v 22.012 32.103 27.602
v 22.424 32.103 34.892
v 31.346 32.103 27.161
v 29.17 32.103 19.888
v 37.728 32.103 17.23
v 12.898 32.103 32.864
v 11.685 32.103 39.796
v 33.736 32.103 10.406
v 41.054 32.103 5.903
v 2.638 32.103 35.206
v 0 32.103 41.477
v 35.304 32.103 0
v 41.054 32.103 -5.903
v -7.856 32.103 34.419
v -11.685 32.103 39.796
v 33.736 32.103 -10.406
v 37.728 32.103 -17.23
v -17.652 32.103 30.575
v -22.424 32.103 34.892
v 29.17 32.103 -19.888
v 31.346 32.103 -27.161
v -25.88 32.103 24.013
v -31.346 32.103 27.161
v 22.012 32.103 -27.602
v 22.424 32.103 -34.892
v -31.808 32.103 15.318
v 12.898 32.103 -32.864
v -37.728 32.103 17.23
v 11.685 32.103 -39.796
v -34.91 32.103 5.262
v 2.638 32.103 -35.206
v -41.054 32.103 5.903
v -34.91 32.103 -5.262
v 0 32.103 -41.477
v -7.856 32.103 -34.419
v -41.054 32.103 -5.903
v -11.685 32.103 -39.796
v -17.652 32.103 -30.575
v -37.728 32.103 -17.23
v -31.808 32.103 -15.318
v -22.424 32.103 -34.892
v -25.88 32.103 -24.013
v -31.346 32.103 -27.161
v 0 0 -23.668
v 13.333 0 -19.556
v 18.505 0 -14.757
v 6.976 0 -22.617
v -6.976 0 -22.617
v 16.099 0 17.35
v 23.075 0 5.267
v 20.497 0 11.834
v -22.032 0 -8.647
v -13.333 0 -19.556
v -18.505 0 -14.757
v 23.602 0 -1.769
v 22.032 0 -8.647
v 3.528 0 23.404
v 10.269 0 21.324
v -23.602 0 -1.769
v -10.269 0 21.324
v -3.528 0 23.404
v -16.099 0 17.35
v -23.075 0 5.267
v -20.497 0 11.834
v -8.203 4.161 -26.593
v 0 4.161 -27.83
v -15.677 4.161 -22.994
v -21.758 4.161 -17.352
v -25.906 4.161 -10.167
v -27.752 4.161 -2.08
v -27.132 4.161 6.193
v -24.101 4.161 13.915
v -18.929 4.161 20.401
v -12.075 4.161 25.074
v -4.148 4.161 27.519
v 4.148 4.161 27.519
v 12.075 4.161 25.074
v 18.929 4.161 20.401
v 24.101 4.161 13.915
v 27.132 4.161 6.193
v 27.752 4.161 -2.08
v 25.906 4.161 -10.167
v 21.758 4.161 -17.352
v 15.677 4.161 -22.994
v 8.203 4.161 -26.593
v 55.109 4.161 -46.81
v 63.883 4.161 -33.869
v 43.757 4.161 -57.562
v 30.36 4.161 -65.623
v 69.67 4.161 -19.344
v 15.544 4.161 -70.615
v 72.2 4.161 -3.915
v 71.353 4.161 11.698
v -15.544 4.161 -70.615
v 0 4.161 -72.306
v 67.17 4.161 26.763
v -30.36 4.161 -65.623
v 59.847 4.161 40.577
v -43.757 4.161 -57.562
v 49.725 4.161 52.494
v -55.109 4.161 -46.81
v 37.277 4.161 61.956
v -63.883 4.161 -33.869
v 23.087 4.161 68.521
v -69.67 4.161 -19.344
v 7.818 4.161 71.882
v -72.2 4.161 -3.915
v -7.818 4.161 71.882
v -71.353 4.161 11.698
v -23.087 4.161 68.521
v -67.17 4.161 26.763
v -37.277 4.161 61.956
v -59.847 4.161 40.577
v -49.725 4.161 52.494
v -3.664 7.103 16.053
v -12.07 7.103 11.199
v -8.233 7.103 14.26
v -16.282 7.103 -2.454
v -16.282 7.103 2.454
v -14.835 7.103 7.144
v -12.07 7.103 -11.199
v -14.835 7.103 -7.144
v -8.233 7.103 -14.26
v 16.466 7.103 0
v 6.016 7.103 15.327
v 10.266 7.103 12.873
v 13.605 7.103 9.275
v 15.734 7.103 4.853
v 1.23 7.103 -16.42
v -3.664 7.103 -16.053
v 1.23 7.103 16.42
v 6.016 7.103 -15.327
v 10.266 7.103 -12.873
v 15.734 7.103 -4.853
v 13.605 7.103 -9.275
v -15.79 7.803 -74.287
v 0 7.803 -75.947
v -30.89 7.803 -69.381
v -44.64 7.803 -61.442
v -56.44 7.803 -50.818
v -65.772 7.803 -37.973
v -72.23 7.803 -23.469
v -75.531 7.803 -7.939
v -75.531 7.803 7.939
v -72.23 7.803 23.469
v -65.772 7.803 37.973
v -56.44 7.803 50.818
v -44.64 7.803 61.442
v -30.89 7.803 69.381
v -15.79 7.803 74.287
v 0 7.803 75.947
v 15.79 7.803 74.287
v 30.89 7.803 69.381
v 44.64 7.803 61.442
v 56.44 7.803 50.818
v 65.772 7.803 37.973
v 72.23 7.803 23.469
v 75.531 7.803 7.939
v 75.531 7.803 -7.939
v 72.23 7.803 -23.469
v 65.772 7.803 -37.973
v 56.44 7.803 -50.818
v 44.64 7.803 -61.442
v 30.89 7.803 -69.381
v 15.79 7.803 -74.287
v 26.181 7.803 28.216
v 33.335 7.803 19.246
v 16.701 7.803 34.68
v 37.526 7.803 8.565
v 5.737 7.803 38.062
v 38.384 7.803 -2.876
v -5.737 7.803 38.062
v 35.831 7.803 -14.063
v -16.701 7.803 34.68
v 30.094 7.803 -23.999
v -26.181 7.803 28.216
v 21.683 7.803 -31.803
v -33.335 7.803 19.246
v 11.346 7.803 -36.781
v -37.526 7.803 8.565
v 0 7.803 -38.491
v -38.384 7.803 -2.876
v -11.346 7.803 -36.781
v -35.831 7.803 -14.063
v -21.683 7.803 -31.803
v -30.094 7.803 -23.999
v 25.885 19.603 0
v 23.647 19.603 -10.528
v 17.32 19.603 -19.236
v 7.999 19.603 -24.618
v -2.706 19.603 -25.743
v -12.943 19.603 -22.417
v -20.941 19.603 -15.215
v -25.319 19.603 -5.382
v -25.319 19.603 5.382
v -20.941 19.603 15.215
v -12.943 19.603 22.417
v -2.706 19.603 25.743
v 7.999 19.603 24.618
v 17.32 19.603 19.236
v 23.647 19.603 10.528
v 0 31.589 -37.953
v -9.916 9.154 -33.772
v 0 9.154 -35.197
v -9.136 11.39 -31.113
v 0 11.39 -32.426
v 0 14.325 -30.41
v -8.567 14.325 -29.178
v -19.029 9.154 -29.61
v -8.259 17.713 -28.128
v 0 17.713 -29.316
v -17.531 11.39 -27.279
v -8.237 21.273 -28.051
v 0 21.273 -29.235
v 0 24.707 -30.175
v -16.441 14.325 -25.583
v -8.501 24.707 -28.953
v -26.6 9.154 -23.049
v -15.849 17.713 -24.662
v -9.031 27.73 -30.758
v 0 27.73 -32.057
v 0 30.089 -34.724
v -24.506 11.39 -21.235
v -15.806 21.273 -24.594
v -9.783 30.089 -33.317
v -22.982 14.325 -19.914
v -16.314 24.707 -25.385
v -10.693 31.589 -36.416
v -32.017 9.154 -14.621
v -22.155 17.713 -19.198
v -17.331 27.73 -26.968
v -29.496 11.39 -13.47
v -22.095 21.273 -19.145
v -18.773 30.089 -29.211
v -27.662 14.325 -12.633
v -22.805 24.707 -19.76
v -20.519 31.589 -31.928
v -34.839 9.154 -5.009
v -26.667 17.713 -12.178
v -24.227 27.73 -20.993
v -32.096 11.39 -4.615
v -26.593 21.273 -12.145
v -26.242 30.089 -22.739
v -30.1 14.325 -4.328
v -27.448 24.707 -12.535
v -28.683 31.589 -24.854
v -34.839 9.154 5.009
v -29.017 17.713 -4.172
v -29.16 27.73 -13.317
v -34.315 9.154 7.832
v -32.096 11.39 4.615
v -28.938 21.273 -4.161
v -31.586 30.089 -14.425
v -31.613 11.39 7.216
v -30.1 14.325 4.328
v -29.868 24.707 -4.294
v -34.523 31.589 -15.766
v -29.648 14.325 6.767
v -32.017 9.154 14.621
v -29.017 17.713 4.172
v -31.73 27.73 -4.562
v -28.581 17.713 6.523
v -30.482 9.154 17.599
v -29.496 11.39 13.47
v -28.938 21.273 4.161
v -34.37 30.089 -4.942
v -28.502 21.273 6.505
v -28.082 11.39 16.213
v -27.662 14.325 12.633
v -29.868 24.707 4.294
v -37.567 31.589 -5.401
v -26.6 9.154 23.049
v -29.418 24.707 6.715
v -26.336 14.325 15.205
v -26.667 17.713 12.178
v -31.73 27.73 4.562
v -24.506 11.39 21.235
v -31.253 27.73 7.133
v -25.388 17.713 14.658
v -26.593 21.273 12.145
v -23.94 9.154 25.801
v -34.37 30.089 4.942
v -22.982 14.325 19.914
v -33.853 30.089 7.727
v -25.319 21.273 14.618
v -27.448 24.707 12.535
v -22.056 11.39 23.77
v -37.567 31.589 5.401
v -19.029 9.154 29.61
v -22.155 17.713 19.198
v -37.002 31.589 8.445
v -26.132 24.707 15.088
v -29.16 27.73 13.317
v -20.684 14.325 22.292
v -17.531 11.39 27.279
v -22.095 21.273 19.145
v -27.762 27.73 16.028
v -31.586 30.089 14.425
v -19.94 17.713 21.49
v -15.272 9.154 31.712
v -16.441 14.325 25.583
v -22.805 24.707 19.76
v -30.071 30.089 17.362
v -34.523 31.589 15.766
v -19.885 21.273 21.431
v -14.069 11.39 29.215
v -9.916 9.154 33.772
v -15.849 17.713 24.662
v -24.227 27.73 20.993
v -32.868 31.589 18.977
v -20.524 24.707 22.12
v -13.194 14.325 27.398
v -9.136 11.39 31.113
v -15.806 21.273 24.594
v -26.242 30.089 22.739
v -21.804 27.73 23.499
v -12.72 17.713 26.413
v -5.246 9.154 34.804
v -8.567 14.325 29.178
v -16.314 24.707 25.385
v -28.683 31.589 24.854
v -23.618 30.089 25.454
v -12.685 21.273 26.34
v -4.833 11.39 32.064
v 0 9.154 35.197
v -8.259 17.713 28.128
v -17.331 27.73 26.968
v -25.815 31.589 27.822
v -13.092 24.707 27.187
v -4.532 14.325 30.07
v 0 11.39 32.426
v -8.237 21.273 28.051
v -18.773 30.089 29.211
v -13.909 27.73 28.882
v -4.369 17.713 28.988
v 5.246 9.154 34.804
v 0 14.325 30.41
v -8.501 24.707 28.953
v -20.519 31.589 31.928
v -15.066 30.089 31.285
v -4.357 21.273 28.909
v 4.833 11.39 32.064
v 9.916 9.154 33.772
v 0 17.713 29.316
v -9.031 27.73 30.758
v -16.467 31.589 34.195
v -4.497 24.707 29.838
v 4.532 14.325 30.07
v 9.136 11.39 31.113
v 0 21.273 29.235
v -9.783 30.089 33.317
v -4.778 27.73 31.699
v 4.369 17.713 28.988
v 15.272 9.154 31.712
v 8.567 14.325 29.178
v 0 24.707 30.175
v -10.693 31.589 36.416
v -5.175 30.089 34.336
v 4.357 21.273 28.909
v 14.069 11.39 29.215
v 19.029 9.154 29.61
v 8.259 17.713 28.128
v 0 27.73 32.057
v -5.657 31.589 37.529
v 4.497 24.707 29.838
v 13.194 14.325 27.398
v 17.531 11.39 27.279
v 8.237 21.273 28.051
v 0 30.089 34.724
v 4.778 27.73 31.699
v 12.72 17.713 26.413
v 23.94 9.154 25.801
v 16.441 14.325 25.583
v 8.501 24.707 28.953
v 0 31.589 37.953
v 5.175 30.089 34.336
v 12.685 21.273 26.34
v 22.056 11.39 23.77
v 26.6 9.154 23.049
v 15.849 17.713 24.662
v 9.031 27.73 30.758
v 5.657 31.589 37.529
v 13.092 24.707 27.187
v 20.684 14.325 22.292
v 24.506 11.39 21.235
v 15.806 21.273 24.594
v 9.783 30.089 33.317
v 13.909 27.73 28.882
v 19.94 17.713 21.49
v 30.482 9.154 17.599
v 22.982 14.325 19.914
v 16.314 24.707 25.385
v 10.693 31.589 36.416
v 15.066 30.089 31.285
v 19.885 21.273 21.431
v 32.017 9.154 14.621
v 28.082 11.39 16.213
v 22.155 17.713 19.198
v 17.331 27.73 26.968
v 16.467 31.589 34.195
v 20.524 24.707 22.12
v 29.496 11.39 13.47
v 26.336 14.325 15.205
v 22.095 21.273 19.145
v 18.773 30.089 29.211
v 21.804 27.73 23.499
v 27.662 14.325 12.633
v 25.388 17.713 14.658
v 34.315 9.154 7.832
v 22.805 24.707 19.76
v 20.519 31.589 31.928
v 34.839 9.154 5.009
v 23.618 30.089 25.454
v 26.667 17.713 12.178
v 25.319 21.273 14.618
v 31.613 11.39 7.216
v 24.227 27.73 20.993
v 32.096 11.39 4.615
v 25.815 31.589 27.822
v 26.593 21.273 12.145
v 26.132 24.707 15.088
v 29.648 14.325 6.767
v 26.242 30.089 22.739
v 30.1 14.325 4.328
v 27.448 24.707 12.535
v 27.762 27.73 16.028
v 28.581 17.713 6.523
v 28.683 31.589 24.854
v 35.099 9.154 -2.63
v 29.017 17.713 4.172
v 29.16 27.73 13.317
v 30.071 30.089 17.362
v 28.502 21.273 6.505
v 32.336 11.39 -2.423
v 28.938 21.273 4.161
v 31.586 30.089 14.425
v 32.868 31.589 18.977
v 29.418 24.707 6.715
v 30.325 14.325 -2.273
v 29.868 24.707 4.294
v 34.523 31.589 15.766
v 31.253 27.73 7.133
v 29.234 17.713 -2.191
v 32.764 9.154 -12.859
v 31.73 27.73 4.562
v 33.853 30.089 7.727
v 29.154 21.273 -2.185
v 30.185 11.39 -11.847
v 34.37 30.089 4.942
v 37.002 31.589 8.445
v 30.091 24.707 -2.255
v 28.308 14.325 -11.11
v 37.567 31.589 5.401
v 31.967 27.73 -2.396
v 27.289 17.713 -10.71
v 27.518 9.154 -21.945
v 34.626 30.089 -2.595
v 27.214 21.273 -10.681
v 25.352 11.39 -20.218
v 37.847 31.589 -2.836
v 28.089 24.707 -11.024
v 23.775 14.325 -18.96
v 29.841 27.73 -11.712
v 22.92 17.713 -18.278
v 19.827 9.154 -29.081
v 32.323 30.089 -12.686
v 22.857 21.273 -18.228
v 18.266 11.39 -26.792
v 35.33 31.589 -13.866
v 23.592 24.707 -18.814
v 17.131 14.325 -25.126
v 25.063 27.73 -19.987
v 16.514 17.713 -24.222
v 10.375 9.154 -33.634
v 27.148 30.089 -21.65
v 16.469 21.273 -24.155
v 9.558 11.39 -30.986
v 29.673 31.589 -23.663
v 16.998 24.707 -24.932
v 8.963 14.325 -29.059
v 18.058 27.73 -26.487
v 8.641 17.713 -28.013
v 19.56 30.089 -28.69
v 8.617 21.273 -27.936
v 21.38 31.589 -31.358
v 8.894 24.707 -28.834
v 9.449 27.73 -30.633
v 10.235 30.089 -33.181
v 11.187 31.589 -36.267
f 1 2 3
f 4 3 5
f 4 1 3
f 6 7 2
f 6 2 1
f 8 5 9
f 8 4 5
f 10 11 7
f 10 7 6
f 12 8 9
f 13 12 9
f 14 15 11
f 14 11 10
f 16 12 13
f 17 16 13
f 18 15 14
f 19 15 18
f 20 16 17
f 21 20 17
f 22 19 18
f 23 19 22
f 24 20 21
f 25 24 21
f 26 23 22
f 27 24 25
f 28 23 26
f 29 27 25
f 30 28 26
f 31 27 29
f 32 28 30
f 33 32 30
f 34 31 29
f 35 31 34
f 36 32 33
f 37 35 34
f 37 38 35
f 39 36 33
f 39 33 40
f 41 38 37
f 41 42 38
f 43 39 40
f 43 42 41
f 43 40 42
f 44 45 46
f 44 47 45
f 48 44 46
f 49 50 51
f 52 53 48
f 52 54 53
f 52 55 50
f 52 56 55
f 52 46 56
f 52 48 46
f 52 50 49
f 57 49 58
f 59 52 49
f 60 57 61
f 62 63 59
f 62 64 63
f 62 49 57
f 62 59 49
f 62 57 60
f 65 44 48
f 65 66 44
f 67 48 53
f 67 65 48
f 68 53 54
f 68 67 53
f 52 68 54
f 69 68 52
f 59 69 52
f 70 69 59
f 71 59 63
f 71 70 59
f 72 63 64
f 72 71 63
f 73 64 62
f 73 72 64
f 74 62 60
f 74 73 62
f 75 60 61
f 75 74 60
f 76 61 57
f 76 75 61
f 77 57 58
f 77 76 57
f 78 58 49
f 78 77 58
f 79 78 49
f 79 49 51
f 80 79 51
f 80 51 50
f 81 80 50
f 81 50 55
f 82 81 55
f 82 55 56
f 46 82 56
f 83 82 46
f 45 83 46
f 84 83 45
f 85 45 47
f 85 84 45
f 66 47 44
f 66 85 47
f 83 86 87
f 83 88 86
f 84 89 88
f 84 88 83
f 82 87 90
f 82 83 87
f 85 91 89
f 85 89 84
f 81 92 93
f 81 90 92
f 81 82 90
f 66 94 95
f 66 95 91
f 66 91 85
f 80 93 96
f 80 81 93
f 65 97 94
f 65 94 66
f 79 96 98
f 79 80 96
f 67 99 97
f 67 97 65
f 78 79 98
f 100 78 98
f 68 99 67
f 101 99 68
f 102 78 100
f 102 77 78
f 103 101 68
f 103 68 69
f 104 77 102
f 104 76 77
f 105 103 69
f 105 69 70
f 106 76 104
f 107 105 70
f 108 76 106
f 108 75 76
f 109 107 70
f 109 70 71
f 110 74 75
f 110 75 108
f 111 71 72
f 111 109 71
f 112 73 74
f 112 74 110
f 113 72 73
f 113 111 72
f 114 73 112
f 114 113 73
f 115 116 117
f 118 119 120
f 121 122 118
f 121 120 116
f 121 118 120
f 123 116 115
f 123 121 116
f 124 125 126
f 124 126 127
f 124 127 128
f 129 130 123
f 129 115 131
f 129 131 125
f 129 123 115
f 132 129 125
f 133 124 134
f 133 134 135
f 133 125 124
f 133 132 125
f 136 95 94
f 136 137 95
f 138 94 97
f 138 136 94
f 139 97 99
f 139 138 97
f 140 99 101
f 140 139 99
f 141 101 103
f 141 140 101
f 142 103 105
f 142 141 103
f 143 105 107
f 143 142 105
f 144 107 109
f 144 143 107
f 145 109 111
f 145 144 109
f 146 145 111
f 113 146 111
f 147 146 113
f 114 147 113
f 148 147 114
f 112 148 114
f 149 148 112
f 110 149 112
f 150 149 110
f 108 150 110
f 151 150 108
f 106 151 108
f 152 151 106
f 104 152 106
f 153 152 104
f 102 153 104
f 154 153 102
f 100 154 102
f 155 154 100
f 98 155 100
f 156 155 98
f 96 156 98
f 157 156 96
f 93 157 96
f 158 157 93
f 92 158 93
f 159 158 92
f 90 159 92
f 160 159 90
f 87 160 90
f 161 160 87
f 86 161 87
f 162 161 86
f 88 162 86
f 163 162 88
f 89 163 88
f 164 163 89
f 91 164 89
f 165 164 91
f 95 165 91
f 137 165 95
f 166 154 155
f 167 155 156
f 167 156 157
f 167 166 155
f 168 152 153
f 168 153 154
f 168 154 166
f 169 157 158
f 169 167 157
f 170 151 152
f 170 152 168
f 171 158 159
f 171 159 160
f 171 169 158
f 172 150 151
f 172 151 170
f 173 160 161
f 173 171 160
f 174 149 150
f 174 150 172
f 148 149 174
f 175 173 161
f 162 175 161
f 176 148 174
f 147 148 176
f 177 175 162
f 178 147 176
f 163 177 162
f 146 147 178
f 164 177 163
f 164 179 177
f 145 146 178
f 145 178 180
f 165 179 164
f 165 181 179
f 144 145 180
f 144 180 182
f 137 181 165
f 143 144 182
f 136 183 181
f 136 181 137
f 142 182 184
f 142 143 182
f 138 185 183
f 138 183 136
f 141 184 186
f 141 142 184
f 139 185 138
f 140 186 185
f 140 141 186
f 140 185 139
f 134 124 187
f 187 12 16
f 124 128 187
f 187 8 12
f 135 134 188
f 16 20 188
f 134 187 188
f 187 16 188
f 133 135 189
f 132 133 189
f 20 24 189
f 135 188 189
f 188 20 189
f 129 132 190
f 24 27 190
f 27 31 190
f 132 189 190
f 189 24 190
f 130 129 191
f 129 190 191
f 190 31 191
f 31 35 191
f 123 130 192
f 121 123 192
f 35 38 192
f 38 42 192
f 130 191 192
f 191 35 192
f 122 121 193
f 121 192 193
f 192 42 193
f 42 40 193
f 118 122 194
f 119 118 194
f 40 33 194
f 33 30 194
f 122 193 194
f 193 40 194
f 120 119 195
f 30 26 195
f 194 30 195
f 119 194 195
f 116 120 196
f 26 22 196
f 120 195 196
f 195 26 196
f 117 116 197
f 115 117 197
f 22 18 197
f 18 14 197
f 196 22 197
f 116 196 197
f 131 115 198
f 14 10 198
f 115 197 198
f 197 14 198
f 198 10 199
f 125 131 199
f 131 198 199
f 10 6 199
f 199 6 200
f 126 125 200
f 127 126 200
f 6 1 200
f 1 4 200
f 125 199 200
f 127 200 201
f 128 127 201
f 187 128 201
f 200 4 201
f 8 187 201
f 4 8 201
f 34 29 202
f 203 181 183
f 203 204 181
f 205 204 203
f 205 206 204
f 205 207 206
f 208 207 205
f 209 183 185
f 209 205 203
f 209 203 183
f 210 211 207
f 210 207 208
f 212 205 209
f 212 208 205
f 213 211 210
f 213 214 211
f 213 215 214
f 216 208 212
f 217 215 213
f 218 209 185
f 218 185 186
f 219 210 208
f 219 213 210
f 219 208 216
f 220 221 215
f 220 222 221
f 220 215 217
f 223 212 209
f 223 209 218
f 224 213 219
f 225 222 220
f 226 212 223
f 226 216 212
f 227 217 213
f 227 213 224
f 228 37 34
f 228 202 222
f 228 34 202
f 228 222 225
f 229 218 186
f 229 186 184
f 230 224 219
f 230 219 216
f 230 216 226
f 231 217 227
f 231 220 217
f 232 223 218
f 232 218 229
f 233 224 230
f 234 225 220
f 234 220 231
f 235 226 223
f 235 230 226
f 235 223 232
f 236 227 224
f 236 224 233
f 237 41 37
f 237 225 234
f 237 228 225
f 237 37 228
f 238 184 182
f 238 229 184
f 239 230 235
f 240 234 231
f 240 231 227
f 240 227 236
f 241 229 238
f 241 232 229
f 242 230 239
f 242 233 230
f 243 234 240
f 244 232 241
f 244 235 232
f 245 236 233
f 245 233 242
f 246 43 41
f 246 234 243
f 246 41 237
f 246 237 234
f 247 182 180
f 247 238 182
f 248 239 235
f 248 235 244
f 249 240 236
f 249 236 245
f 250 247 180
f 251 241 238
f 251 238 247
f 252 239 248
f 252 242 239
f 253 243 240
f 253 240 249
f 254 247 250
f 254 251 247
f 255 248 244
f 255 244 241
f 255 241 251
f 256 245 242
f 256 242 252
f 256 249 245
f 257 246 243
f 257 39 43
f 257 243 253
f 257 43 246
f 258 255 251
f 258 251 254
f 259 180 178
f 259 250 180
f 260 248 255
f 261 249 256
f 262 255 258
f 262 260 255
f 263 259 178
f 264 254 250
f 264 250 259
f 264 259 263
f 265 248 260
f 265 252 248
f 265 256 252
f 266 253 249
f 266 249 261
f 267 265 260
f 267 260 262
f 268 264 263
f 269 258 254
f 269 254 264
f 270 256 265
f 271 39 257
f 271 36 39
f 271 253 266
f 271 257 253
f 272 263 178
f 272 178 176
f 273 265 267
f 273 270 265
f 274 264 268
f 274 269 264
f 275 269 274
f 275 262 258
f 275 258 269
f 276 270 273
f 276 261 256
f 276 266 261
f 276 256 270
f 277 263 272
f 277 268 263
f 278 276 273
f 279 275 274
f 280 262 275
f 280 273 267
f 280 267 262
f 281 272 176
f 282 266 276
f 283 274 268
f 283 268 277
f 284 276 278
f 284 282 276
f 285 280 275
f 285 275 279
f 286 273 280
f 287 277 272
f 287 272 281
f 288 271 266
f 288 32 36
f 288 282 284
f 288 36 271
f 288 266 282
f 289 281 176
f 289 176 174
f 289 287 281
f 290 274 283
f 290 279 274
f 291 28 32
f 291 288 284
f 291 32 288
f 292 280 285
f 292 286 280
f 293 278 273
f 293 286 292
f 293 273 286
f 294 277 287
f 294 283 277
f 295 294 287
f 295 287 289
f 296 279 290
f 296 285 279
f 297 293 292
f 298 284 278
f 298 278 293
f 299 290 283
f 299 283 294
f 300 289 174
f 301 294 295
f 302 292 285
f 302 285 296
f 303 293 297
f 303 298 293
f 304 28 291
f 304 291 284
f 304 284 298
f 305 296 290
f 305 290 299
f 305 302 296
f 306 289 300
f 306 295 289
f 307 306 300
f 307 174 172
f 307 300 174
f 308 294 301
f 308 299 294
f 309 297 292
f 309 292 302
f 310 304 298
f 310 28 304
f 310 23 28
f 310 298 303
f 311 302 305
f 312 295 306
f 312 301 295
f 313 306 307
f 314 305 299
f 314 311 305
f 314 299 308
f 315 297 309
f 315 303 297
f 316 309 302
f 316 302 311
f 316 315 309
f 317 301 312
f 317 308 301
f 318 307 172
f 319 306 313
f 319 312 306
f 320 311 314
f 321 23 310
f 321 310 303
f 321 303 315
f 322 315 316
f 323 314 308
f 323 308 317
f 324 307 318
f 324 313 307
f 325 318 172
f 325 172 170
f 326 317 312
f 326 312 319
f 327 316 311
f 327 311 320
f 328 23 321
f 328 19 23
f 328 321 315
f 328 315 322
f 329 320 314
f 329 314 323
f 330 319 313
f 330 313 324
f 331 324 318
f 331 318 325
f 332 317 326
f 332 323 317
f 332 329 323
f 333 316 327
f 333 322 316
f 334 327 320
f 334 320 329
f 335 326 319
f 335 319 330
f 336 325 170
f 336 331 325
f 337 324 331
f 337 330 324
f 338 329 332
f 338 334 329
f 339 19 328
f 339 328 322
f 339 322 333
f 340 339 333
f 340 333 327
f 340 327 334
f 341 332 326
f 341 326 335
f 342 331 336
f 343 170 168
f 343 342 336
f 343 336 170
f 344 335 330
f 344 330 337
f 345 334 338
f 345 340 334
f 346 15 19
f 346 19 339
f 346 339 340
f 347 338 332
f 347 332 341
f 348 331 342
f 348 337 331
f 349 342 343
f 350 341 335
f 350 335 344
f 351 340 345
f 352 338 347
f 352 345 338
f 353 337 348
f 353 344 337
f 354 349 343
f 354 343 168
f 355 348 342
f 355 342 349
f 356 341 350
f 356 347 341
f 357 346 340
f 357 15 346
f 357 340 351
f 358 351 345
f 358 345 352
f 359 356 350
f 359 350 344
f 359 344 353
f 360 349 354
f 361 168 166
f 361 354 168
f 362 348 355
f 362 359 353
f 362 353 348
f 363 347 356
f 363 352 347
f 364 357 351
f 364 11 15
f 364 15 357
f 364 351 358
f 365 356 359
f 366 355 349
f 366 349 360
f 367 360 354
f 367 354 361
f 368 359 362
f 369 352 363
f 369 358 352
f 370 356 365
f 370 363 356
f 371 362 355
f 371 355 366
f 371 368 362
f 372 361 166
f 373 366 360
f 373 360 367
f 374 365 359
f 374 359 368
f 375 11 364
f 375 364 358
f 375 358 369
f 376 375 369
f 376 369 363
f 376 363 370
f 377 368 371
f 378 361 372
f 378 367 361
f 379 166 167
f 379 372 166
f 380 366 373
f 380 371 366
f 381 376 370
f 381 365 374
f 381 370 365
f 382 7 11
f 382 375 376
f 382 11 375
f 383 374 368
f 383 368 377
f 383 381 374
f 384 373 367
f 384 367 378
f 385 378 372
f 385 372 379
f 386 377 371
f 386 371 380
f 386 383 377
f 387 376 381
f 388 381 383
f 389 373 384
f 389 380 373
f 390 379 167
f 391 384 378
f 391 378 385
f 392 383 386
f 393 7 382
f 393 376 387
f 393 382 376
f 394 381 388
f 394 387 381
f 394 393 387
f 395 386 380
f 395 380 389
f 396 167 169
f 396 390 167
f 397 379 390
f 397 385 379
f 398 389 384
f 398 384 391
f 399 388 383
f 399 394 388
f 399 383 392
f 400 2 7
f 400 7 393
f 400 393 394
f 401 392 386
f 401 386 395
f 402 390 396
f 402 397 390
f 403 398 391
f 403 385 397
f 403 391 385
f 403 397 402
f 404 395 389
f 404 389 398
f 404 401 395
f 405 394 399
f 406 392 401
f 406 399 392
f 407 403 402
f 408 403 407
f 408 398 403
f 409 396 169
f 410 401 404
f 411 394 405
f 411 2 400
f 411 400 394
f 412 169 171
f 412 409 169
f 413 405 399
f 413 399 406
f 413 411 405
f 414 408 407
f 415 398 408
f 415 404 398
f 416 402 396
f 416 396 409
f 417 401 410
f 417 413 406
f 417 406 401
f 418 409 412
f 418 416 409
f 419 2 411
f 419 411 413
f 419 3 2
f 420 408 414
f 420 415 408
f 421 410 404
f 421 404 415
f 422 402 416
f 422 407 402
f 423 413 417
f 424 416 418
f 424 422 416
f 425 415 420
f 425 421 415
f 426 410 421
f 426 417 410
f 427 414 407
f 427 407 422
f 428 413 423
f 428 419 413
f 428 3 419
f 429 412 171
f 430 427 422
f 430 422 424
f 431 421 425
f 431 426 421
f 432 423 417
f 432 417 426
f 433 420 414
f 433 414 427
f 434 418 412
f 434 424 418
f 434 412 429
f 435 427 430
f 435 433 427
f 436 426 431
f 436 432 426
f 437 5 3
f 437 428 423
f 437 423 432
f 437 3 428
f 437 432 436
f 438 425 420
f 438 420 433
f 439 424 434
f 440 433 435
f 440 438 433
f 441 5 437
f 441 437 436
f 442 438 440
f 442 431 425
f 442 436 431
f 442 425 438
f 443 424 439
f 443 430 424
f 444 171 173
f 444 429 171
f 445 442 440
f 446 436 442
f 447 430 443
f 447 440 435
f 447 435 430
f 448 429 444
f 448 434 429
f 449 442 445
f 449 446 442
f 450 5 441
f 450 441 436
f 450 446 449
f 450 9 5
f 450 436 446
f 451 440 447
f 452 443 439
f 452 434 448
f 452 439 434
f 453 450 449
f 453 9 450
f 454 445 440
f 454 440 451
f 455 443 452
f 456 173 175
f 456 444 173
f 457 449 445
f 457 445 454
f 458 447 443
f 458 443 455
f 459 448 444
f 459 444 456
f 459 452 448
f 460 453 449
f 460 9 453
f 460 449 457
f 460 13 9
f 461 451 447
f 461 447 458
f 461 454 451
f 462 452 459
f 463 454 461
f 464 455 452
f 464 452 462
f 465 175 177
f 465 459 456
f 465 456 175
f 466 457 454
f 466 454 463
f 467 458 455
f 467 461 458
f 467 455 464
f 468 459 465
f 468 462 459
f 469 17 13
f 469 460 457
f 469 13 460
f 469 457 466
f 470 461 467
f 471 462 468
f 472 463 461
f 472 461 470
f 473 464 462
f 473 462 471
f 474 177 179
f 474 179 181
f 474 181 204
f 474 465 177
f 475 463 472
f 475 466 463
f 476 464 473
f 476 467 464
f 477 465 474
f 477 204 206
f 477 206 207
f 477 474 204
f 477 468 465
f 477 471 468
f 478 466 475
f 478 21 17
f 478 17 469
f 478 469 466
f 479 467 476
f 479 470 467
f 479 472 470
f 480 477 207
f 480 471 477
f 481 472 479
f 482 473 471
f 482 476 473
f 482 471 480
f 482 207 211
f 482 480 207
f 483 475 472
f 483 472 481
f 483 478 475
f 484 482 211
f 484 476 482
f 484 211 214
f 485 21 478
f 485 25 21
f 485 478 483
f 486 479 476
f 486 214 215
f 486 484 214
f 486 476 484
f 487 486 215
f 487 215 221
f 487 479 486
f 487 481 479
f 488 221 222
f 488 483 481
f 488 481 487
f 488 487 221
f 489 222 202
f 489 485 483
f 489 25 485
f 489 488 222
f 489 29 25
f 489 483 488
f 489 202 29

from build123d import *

# Parameters (mm, degrees)
SKETCH3_R          = 35.304496673
CUT_EXTRUDE2_DEPTH = 25
CUT_EXTRUDE2_DRAFT = -37


with BuildPart() as part:
    # Sketch1 → Revolve1 (revolve)
    with BuildSketch(Plane.XY, mode=Mode.PRIVATE) as revolve1_sk:
        Polygon((0, 0), (-23.668379582, 0), (-27.829852915, 4.161473333), (-72.305599163, 4.161473333), (-75.946888329, 7.8027625), (0, 7.8027625), align=None)
    revolve(revolve1_sk.sketch.rotate(Axis((0, 0, 0), (0, 1, 0)), 270), axis=Axis((0, 0, 0), (0, 1, 0)))

    # Sketch2 → Revolve2 (revolve)
    with BuildSketch(Plane.XY, mode=Mode.PRIVATE) as revolve2_sk:
        with BuildLine():
            Line((-41.476502692, 32.102501356), (0, 32.102501356))
            Line((0, 32.102501356), (0, 7.8027625))
            Line((0, 7.8027625), (-38.491451362, 7.8027625))
            ThreePointArc((-38.491451362, 7.8027625), (-29.235303405, 21.273030582), (-41.476502692, 32.102501356))
        make_face()
    revolve(revolve2_sk.sketch.rotate(Axis((0, 0, 0), (0, 1, 0)), 270), axis=Axis((0, 0, 0), (0, 1, 0)))


with BuildPart() as cut_extrude2_tool:
    # Sketch3 → Cut-Extrude2 (with draft: the straight prism first)
    with BuildSketch(Plane(origin=(0, 32.102501356, 0), x_dir=(1, 0, 0), z_dir=(0, 1, 0))):
        Circle(SKETCH3_R)
    extrude(amount=-CUT_EXTRUDE2_DEPTH)
    # Cut-Extrude2: the draft: its side faces are tilted about the plane it starts from
    cut_extrude2_sides = [cut_extrude2_tool.faces().sort_by_distance(p)[0] for p in [
        (-35.304496673, 19.602501356, 0),
    ]]
    draft(cut_extrude2_sides, Plane(origin=(0, 32.102501356, 0), x_dir=(1, 0, 0), z_dir=(0, 1, 0)), CUT_EXTRUDE2_DRAFT)


with BuildPart() as part_1:
    add(part.part)

    # Cut-Extrude2: cut by cut_extrude2_tool
    add(cut_extrude2_tool.part, mode=Mode.SUBTRACT)


solid = part_1.part
